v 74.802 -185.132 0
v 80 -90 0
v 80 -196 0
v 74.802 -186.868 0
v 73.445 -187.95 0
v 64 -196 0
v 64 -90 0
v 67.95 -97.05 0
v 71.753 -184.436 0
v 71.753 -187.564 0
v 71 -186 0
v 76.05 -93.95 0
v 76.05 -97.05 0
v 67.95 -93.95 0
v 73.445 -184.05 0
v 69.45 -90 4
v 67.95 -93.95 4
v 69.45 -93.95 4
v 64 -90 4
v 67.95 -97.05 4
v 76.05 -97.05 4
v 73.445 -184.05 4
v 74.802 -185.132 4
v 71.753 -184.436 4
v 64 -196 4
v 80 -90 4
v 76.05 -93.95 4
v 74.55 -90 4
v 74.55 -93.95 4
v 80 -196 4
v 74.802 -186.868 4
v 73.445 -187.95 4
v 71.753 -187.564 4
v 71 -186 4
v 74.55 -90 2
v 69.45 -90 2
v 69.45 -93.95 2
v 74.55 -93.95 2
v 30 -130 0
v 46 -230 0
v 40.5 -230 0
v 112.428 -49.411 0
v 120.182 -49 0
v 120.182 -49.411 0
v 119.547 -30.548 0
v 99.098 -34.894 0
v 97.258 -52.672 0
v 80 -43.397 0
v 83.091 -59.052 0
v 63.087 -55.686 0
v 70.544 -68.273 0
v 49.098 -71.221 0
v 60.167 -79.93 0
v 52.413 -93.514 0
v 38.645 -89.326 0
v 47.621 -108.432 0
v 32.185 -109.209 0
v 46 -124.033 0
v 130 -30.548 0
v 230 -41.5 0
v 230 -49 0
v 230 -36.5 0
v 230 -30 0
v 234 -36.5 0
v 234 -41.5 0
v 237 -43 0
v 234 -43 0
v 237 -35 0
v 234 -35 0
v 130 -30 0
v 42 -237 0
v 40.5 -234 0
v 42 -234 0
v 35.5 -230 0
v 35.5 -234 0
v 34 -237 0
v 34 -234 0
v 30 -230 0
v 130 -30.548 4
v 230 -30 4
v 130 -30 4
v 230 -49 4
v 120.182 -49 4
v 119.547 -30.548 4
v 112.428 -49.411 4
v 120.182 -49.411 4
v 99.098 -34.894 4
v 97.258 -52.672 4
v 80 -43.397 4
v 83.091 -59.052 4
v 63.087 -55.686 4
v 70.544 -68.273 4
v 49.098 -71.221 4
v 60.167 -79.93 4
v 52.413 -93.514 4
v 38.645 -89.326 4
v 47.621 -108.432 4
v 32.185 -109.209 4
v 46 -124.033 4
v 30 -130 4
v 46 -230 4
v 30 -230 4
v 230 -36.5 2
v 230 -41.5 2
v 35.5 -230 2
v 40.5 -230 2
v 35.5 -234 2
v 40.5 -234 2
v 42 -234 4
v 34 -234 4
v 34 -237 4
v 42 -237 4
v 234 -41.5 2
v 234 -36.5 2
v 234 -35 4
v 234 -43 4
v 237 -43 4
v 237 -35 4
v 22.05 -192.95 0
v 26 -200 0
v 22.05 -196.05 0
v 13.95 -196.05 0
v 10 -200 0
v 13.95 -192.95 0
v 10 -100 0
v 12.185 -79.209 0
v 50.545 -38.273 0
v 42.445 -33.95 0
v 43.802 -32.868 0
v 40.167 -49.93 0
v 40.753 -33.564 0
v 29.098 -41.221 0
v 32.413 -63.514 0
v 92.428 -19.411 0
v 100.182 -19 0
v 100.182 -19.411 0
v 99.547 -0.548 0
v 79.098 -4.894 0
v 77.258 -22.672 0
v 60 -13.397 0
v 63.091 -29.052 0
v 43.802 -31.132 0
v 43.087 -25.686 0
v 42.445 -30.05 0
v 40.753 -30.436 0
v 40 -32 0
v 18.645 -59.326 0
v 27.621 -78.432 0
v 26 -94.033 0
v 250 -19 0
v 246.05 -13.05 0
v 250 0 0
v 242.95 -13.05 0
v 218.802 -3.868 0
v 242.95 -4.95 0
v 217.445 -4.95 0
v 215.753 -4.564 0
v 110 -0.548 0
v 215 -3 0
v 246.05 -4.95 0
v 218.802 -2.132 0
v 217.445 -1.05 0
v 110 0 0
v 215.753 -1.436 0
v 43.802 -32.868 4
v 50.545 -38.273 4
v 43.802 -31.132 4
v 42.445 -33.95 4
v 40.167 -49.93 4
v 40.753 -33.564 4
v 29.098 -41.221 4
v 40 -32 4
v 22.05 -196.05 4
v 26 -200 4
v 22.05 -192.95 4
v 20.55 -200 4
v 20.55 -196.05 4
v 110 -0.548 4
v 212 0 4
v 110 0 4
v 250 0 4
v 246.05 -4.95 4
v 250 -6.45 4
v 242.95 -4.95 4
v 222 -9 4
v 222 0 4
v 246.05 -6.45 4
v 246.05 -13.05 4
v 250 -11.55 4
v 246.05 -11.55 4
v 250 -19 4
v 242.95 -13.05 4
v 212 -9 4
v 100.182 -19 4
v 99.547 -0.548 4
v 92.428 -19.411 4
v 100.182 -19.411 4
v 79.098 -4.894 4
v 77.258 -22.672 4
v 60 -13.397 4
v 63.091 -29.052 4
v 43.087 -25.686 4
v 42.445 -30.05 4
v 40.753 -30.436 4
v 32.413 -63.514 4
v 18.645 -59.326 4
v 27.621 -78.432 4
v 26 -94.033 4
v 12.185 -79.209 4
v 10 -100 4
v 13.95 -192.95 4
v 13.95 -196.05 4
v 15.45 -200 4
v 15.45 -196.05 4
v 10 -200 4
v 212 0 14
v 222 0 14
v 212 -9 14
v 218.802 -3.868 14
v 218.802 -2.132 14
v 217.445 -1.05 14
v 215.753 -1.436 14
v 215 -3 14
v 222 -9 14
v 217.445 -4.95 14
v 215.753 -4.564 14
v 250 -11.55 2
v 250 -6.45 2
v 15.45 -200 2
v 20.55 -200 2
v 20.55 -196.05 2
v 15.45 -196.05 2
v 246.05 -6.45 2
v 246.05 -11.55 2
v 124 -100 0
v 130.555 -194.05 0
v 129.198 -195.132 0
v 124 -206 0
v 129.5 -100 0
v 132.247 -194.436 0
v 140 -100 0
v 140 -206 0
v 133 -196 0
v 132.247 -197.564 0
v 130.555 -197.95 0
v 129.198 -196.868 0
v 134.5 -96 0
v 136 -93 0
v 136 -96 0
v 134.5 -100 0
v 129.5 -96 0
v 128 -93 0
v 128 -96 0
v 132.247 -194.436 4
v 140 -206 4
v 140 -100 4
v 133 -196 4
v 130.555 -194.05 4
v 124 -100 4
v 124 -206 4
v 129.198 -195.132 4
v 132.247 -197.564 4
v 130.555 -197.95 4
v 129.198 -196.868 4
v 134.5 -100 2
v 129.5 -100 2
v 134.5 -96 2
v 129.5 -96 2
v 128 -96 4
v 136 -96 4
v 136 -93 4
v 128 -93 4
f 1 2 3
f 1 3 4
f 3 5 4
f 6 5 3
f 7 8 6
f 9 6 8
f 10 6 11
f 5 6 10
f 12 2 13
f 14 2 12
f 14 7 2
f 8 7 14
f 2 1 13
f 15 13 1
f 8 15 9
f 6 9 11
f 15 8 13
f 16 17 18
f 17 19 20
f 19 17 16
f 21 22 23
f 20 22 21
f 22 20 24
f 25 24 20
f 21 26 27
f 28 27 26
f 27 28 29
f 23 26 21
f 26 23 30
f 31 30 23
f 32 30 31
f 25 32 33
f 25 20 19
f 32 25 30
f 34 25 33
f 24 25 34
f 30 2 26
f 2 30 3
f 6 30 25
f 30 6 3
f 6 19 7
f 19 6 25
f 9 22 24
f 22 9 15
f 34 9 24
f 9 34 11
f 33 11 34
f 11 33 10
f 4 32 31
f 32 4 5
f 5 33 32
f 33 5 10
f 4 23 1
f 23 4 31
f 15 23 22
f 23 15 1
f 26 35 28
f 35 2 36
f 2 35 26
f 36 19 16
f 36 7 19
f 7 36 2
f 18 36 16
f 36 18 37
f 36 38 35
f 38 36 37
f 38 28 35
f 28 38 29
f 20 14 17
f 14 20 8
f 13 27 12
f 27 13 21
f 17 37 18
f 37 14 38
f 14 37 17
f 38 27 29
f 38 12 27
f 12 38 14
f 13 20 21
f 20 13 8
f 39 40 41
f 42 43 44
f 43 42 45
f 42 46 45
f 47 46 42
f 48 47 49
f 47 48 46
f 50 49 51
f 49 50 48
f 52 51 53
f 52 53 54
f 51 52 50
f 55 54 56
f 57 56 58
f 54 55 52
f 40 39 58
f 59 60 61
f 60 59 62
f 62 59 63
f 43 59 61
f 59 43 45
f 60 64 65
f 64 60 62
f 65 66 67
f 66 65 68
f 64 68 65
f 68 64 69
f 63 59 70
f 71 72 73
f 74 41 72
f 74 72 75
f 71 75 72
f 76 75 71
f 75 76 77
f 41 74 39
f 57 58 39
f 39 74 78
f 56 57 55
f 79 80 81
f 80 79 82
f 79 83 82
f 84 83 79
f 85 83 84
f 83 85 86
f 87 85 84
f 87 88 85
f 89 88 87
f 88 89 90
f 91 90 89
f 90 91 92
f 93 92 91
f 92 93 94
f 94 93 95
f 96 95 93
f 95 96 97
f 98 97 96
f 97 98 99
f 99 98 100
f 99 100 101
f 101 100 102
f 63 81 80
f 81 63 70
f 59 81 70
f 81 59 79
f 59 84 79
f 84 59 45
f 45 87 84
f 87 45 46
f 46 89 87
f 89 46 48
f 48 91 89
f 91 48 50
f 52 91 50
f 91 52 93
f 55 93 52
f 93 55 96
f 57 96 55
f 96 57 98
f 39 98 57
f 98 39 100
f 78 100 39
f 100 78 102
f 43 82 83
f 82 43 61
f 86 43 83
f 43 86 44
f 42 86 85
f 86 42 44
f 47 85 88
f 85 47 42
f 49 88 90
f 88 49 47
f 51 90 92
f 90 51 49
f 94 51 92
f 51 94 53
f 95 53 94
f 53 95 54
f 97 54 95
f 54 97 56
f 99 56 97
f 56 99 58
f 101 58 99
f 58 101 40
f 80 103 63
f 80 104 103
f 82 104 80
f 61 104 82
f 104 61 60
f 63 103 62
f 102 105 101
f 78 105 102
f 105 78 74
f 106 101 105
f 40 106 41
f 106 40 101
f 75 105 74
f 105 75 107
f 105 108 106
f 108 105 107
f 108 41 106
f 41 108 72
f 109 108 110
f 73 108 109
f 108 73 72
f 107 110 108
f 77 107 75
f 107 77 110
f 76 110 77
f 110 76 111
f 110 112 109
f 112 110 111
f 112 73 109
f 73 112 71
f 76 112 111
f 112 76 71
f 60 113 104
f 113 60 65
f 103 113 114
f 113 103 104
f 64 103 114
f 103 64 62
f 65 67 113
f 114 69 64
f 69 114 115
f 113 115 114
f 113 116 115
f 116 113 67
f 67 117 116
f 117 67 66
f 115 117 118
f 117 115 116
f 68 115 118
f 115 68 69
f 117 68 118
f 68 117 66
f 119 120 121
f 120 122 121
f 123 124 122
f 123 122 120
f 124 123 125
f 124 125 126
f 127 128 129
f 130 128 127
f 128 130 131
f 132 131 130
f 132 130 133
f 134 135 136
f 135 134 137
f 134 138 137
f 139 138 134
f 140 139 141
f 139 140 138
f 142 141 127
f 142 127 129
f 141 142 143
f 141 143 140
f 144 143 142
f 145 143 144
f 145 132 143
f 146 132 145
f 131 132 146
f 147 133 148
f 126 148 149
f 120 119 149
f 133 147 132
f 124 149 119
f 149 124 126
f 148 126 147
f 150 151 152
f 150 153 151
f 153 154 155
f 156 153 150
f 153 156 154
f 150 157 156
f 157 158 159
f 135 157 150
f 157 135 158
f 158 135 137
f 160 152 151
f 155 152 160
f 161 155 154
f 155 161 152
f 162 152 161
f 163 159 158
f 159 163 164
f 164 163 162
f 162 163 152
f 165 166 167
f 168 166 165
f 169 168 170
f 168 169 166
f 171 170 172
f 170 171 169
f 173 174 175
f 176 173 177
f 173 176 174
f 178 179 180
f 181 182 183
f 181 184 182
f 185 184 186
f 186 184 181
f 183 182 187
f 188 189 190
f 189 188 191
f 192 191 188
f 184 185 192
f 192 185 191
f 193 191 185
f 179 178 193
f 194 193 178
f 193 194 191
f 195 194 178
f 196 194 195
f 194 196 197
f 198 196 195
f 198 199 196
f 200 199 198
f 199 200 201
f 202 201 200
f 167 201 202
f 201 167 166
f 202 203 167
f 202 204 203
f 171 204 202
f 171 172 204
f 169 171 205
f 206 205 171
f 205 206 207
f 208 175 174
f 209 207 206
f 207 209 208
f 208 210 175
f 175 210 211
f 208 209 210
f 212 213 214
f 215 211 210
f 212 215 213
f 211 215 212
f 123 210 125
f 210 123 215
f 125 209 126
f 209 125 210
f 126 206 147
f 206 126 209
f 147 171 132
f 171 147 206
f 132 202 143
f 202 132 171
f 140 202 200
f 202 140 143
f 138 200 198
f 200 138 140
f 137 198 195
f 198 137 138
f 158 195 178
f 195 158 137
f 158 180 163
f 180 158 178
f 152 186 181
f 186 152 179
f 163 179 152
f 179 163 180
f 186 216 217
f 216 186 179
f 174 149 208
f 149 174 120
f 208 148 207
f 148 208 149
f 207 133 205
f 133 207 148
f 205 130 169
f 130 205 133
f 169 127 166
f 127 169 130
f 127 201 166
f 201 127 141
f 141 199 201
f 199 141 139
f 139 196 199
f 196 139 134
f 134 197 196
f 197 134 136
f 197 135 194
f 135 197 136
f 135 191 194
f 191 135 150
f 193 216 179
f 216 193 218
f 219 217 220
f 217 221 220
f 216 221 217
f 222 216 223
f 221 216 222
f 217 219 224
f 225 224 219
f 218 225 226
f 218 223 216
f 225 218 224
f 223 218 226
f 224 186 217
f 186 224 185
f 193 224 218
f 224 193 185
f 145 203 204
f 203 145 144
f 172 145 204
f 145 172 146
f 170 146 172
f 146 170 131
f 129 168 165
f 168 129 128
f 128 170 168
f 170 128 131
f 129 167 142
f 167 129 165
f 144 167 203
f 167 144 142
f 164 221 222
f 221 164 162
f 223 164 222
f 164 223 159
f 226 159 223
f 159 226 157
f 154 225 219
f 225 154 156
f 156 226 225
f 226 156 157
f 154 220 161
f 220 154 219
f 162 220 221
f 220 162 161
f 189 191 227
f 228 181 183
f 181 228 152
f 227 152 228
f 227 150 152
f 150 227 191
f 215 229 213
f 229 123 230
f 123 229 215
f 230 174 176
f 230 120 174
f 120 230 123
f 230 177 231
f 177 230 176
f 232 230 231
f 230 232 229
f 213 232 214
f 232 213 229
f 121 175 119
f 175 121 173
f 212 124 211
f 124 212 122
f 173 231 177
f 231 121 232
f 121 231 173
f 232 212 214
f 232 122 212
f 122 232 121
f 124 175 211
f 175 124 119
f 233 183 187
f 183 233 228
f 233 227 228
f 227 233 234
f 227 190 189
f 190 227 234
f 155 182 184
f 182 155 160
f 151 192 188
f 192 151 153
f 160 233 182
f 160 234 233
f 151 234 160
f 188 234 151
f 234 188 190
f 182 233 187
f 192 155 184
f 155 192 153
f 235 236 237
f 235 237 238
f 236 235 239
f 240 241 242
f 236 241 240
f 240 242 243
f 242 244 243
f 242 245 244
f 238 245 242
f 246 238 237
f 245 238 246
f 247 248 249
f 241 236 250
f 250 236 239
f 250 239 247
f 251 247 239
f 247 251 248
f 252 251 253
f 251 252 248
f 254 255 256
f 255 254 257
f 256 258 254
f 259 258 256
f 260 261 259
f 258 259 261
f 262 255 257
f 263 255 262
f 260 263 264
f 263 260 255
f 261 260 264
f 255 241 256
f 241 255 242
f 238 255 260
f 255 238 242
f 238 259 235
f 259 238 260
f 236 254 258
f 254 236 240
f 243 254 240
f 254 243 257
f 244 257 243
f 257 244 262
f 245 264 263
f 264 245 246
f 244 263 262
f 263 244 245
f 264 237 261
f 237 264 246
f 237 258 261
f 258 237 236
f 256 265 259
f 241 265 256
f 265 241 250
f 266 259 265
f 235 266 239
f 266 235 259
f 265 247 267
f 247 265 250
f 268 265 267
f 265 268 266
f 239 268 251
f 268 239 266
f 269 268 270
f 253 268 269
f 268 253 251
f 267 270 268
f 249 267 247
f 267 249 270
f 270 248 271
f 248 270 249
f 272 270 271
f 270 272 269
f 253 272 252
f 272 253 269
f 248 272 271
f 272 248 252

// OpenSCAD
// file: utilities.scad
module screw_hole(screw_size) {
  translate([0, 0, -15])
  cylinder(h = 30, r = screw_size / 2);
}

module cut_piece(selection_size, selection_translate) {
  intersection() {
    translate(selection_translate)
    cube(selection_size);

    children(0);
  }
}
// file: flat-panel-joint.scad
/* 
 * Based on a work at https://skfb.ly/p8Zyr.
 * "Flat panel joint part 1" (https://skfb.ly/p8Zyr) by payo@TensileCreator is licensed under Creative Commons Attribution-NonCommercial (http://creativecommons.org/licenses/by-nc/4.0/).
 */

/*
 * Usage example:
 * add_seam_to(joint_count = 7, translate_seam = [0, -50, 0], rotate_seam = [0, 0, 90]) {
 *   translate([0, -50, 0])
 *   cube([50, 80, 4]);
 * };
 *
 * mirror([1, 0, 0]) {
 *   add_seam_to(joint_count = 7, translate_seam = [20, 30, 0], rotate_seam = [0, 0, 270], invert_seam = true) {
 *     translate([20, -50, 0])
 *     cube([50, 80, 4]);
 *   };
 * };
 */
module add_seam_to(joint_count, translate_seam = [0, 0, 0], rotate_seam = [0, 0, 0], scale_xy = 1, z_height = 4, invert_seam = false) {
    joint_spacing=21;
    tolerance=0.05;
    first_iteration_count = ceil(joint_count / 2) - 1;
    second_iteration_count = max(floor(joint_count / 2) - 1, 0);

    union() {
        difference() {
            children(0);
            if (invert_seam || joint_count > 1) {
                translate(translate_seam)
                rotate(rotate_seam)
                for (i=[0:(invert_seam ? first_iteration_count : second_iteration_count)]) {
                    translate([(i * joint_spacing * scale_xy) + (invert_seam ? (8 * scale_xy) : (10.5 * scale_xy)), 0, 0])
                    rotate([0, 0, invert_seam ? 180 : 0])
                    union() {
                        translate([1.5 * scale_xy - tolerance, -4 * scale_xy, z_height / 2])
                        cube([5 * scale_xy + (tolerance*2), 4 * scale_xy + tolerance, (z_height / 2) + tolerance]);
                        translate([0 - tolerance, -7 * scale_xy - tolerance, 0 - tolerance])
                        cube([8 * scale_xy + (tolerance*2), 3 * scale_xy + (tolerance*2), z_height + (tolerance*2)]);
                    }
                }
            }
        }
        if (!invert_seam || joint_count > 1) {
            translate(translate_seam)
            rotate(rotate_seam)
            for (i=[(invert_seam ? 1 : 0):(invert_seam ? second_iteration_count : first_iteration_count)]) {
                translate([(i * joint_spacing * scale_xy), 0, 0])
                rotate([0, 0, invert_seam ? 180 : 0])
                union() {
                    translate([1.5 * scale_xy, 0, 0])
                    cube([5 * scale_xy, 4 * scale_xy, (z_height / 2)]);
                    translate([0, 4 * scale_xy, 0])
                    cube([8 * scale_xy, 3 * scale_xy, z_height]);
                }
            }
        }
    }
}
// main file
use <flat-panel-joint.scad>;
use <utilities.scad>;
//$fn = 50;

side_width = 16;
side_height = 19;

inner_width = 408;
inner_height = 287;

outer_width = inner_width + side_width * 2;
outer_height = inner_height + side_height;
inner_radius = 80;
outer_radius = 100;

module cover_shape(radius) {
  translate([radius, -radius, 0]) 
  circle(radius);

  rad_midpoint_dist = outer_width - radius - radius;
  translate([radius, -radius -radius, 0])
  square([rad_midpoint_dist, radius * 2]);

  translate([outer_width - radius, -radius, 0])
  circle(radius);

  translate([0, -outer_height, 0]) 
  square([outer_width, outer_height - radius]);
}

module final_prototype() {
  difference() {
    union() {
      difference() {
        // Cover outer shape
        linear_extrude(4)
        cover_shape(outer_radius);

        // Cover inner shape
        translate([side_width, -side_height, -5])
        linear_extrude(10)
        scale([inner_width / outer_width, inner_height / outer_height, 1])
        cover_shape(inner_radius);
      }

      translate([side_width + 217, -(side_height - 16) -1.5, 9])
      cube([10, 9, 10], center = true);
    }

    union() {
      // Lower left
      translate([side_width - 9, -inner_height - 9, 0])
      screw_hole(4);

      // Lower right
      translate([side_width + inner_width + side_width - 9, -inner_height - 9, 0])
      screw_hole(4);

      // Corner
      translate([inner_width, -(side_height + 13), 0])
      screw_hole(4);

      // Top
      translate([side_width + 217, -(side_height - 16), 0])
      screw_hole(4);
    }
  }
}

// Lower left
translate([80, 110, 0])
mirror([1, 0, 0])
add_seam_to(joint_count = 1, translate_seam = [12, -200, 0], rotate_seam = [0, 0, 180], invert_seam = true)
cut_piece(200, [0, -400, -100])
final_prototype();

// Upper left
translate([30, -30, 0])
add_seam_to(joint_count = 1, translate_seam = [200, -5, 0], rotate_seam = [0, 0, 270])
add_seam_to(joint_count = 1, translate_seam = [12, -200, 0], rotate_seam = [0, 0, 180])
cut_piece(200, [0, -200, -100])
final_prototype();

// Upper right
mirror([1, 0, 0])
translate([-450, 0, 0])
add_seam_to(joint_count = 1, translate_seam = [200, -5, 0], rotate_seam = [0, 0, 270], invert_seam = true)
add_seam_to(joint_count = 1, translate_seam = [428, -200, 0], invert_seam = true)
cut_piece(300, [200, -200, -100])
final_prototype();

// Lower right
translate([-300, 100, 0])
add_seam_to(joint_count = 1, translate_seam = [428, -200, 0])
cut_piece(300, [200, -500, -100])
final_prototype();
